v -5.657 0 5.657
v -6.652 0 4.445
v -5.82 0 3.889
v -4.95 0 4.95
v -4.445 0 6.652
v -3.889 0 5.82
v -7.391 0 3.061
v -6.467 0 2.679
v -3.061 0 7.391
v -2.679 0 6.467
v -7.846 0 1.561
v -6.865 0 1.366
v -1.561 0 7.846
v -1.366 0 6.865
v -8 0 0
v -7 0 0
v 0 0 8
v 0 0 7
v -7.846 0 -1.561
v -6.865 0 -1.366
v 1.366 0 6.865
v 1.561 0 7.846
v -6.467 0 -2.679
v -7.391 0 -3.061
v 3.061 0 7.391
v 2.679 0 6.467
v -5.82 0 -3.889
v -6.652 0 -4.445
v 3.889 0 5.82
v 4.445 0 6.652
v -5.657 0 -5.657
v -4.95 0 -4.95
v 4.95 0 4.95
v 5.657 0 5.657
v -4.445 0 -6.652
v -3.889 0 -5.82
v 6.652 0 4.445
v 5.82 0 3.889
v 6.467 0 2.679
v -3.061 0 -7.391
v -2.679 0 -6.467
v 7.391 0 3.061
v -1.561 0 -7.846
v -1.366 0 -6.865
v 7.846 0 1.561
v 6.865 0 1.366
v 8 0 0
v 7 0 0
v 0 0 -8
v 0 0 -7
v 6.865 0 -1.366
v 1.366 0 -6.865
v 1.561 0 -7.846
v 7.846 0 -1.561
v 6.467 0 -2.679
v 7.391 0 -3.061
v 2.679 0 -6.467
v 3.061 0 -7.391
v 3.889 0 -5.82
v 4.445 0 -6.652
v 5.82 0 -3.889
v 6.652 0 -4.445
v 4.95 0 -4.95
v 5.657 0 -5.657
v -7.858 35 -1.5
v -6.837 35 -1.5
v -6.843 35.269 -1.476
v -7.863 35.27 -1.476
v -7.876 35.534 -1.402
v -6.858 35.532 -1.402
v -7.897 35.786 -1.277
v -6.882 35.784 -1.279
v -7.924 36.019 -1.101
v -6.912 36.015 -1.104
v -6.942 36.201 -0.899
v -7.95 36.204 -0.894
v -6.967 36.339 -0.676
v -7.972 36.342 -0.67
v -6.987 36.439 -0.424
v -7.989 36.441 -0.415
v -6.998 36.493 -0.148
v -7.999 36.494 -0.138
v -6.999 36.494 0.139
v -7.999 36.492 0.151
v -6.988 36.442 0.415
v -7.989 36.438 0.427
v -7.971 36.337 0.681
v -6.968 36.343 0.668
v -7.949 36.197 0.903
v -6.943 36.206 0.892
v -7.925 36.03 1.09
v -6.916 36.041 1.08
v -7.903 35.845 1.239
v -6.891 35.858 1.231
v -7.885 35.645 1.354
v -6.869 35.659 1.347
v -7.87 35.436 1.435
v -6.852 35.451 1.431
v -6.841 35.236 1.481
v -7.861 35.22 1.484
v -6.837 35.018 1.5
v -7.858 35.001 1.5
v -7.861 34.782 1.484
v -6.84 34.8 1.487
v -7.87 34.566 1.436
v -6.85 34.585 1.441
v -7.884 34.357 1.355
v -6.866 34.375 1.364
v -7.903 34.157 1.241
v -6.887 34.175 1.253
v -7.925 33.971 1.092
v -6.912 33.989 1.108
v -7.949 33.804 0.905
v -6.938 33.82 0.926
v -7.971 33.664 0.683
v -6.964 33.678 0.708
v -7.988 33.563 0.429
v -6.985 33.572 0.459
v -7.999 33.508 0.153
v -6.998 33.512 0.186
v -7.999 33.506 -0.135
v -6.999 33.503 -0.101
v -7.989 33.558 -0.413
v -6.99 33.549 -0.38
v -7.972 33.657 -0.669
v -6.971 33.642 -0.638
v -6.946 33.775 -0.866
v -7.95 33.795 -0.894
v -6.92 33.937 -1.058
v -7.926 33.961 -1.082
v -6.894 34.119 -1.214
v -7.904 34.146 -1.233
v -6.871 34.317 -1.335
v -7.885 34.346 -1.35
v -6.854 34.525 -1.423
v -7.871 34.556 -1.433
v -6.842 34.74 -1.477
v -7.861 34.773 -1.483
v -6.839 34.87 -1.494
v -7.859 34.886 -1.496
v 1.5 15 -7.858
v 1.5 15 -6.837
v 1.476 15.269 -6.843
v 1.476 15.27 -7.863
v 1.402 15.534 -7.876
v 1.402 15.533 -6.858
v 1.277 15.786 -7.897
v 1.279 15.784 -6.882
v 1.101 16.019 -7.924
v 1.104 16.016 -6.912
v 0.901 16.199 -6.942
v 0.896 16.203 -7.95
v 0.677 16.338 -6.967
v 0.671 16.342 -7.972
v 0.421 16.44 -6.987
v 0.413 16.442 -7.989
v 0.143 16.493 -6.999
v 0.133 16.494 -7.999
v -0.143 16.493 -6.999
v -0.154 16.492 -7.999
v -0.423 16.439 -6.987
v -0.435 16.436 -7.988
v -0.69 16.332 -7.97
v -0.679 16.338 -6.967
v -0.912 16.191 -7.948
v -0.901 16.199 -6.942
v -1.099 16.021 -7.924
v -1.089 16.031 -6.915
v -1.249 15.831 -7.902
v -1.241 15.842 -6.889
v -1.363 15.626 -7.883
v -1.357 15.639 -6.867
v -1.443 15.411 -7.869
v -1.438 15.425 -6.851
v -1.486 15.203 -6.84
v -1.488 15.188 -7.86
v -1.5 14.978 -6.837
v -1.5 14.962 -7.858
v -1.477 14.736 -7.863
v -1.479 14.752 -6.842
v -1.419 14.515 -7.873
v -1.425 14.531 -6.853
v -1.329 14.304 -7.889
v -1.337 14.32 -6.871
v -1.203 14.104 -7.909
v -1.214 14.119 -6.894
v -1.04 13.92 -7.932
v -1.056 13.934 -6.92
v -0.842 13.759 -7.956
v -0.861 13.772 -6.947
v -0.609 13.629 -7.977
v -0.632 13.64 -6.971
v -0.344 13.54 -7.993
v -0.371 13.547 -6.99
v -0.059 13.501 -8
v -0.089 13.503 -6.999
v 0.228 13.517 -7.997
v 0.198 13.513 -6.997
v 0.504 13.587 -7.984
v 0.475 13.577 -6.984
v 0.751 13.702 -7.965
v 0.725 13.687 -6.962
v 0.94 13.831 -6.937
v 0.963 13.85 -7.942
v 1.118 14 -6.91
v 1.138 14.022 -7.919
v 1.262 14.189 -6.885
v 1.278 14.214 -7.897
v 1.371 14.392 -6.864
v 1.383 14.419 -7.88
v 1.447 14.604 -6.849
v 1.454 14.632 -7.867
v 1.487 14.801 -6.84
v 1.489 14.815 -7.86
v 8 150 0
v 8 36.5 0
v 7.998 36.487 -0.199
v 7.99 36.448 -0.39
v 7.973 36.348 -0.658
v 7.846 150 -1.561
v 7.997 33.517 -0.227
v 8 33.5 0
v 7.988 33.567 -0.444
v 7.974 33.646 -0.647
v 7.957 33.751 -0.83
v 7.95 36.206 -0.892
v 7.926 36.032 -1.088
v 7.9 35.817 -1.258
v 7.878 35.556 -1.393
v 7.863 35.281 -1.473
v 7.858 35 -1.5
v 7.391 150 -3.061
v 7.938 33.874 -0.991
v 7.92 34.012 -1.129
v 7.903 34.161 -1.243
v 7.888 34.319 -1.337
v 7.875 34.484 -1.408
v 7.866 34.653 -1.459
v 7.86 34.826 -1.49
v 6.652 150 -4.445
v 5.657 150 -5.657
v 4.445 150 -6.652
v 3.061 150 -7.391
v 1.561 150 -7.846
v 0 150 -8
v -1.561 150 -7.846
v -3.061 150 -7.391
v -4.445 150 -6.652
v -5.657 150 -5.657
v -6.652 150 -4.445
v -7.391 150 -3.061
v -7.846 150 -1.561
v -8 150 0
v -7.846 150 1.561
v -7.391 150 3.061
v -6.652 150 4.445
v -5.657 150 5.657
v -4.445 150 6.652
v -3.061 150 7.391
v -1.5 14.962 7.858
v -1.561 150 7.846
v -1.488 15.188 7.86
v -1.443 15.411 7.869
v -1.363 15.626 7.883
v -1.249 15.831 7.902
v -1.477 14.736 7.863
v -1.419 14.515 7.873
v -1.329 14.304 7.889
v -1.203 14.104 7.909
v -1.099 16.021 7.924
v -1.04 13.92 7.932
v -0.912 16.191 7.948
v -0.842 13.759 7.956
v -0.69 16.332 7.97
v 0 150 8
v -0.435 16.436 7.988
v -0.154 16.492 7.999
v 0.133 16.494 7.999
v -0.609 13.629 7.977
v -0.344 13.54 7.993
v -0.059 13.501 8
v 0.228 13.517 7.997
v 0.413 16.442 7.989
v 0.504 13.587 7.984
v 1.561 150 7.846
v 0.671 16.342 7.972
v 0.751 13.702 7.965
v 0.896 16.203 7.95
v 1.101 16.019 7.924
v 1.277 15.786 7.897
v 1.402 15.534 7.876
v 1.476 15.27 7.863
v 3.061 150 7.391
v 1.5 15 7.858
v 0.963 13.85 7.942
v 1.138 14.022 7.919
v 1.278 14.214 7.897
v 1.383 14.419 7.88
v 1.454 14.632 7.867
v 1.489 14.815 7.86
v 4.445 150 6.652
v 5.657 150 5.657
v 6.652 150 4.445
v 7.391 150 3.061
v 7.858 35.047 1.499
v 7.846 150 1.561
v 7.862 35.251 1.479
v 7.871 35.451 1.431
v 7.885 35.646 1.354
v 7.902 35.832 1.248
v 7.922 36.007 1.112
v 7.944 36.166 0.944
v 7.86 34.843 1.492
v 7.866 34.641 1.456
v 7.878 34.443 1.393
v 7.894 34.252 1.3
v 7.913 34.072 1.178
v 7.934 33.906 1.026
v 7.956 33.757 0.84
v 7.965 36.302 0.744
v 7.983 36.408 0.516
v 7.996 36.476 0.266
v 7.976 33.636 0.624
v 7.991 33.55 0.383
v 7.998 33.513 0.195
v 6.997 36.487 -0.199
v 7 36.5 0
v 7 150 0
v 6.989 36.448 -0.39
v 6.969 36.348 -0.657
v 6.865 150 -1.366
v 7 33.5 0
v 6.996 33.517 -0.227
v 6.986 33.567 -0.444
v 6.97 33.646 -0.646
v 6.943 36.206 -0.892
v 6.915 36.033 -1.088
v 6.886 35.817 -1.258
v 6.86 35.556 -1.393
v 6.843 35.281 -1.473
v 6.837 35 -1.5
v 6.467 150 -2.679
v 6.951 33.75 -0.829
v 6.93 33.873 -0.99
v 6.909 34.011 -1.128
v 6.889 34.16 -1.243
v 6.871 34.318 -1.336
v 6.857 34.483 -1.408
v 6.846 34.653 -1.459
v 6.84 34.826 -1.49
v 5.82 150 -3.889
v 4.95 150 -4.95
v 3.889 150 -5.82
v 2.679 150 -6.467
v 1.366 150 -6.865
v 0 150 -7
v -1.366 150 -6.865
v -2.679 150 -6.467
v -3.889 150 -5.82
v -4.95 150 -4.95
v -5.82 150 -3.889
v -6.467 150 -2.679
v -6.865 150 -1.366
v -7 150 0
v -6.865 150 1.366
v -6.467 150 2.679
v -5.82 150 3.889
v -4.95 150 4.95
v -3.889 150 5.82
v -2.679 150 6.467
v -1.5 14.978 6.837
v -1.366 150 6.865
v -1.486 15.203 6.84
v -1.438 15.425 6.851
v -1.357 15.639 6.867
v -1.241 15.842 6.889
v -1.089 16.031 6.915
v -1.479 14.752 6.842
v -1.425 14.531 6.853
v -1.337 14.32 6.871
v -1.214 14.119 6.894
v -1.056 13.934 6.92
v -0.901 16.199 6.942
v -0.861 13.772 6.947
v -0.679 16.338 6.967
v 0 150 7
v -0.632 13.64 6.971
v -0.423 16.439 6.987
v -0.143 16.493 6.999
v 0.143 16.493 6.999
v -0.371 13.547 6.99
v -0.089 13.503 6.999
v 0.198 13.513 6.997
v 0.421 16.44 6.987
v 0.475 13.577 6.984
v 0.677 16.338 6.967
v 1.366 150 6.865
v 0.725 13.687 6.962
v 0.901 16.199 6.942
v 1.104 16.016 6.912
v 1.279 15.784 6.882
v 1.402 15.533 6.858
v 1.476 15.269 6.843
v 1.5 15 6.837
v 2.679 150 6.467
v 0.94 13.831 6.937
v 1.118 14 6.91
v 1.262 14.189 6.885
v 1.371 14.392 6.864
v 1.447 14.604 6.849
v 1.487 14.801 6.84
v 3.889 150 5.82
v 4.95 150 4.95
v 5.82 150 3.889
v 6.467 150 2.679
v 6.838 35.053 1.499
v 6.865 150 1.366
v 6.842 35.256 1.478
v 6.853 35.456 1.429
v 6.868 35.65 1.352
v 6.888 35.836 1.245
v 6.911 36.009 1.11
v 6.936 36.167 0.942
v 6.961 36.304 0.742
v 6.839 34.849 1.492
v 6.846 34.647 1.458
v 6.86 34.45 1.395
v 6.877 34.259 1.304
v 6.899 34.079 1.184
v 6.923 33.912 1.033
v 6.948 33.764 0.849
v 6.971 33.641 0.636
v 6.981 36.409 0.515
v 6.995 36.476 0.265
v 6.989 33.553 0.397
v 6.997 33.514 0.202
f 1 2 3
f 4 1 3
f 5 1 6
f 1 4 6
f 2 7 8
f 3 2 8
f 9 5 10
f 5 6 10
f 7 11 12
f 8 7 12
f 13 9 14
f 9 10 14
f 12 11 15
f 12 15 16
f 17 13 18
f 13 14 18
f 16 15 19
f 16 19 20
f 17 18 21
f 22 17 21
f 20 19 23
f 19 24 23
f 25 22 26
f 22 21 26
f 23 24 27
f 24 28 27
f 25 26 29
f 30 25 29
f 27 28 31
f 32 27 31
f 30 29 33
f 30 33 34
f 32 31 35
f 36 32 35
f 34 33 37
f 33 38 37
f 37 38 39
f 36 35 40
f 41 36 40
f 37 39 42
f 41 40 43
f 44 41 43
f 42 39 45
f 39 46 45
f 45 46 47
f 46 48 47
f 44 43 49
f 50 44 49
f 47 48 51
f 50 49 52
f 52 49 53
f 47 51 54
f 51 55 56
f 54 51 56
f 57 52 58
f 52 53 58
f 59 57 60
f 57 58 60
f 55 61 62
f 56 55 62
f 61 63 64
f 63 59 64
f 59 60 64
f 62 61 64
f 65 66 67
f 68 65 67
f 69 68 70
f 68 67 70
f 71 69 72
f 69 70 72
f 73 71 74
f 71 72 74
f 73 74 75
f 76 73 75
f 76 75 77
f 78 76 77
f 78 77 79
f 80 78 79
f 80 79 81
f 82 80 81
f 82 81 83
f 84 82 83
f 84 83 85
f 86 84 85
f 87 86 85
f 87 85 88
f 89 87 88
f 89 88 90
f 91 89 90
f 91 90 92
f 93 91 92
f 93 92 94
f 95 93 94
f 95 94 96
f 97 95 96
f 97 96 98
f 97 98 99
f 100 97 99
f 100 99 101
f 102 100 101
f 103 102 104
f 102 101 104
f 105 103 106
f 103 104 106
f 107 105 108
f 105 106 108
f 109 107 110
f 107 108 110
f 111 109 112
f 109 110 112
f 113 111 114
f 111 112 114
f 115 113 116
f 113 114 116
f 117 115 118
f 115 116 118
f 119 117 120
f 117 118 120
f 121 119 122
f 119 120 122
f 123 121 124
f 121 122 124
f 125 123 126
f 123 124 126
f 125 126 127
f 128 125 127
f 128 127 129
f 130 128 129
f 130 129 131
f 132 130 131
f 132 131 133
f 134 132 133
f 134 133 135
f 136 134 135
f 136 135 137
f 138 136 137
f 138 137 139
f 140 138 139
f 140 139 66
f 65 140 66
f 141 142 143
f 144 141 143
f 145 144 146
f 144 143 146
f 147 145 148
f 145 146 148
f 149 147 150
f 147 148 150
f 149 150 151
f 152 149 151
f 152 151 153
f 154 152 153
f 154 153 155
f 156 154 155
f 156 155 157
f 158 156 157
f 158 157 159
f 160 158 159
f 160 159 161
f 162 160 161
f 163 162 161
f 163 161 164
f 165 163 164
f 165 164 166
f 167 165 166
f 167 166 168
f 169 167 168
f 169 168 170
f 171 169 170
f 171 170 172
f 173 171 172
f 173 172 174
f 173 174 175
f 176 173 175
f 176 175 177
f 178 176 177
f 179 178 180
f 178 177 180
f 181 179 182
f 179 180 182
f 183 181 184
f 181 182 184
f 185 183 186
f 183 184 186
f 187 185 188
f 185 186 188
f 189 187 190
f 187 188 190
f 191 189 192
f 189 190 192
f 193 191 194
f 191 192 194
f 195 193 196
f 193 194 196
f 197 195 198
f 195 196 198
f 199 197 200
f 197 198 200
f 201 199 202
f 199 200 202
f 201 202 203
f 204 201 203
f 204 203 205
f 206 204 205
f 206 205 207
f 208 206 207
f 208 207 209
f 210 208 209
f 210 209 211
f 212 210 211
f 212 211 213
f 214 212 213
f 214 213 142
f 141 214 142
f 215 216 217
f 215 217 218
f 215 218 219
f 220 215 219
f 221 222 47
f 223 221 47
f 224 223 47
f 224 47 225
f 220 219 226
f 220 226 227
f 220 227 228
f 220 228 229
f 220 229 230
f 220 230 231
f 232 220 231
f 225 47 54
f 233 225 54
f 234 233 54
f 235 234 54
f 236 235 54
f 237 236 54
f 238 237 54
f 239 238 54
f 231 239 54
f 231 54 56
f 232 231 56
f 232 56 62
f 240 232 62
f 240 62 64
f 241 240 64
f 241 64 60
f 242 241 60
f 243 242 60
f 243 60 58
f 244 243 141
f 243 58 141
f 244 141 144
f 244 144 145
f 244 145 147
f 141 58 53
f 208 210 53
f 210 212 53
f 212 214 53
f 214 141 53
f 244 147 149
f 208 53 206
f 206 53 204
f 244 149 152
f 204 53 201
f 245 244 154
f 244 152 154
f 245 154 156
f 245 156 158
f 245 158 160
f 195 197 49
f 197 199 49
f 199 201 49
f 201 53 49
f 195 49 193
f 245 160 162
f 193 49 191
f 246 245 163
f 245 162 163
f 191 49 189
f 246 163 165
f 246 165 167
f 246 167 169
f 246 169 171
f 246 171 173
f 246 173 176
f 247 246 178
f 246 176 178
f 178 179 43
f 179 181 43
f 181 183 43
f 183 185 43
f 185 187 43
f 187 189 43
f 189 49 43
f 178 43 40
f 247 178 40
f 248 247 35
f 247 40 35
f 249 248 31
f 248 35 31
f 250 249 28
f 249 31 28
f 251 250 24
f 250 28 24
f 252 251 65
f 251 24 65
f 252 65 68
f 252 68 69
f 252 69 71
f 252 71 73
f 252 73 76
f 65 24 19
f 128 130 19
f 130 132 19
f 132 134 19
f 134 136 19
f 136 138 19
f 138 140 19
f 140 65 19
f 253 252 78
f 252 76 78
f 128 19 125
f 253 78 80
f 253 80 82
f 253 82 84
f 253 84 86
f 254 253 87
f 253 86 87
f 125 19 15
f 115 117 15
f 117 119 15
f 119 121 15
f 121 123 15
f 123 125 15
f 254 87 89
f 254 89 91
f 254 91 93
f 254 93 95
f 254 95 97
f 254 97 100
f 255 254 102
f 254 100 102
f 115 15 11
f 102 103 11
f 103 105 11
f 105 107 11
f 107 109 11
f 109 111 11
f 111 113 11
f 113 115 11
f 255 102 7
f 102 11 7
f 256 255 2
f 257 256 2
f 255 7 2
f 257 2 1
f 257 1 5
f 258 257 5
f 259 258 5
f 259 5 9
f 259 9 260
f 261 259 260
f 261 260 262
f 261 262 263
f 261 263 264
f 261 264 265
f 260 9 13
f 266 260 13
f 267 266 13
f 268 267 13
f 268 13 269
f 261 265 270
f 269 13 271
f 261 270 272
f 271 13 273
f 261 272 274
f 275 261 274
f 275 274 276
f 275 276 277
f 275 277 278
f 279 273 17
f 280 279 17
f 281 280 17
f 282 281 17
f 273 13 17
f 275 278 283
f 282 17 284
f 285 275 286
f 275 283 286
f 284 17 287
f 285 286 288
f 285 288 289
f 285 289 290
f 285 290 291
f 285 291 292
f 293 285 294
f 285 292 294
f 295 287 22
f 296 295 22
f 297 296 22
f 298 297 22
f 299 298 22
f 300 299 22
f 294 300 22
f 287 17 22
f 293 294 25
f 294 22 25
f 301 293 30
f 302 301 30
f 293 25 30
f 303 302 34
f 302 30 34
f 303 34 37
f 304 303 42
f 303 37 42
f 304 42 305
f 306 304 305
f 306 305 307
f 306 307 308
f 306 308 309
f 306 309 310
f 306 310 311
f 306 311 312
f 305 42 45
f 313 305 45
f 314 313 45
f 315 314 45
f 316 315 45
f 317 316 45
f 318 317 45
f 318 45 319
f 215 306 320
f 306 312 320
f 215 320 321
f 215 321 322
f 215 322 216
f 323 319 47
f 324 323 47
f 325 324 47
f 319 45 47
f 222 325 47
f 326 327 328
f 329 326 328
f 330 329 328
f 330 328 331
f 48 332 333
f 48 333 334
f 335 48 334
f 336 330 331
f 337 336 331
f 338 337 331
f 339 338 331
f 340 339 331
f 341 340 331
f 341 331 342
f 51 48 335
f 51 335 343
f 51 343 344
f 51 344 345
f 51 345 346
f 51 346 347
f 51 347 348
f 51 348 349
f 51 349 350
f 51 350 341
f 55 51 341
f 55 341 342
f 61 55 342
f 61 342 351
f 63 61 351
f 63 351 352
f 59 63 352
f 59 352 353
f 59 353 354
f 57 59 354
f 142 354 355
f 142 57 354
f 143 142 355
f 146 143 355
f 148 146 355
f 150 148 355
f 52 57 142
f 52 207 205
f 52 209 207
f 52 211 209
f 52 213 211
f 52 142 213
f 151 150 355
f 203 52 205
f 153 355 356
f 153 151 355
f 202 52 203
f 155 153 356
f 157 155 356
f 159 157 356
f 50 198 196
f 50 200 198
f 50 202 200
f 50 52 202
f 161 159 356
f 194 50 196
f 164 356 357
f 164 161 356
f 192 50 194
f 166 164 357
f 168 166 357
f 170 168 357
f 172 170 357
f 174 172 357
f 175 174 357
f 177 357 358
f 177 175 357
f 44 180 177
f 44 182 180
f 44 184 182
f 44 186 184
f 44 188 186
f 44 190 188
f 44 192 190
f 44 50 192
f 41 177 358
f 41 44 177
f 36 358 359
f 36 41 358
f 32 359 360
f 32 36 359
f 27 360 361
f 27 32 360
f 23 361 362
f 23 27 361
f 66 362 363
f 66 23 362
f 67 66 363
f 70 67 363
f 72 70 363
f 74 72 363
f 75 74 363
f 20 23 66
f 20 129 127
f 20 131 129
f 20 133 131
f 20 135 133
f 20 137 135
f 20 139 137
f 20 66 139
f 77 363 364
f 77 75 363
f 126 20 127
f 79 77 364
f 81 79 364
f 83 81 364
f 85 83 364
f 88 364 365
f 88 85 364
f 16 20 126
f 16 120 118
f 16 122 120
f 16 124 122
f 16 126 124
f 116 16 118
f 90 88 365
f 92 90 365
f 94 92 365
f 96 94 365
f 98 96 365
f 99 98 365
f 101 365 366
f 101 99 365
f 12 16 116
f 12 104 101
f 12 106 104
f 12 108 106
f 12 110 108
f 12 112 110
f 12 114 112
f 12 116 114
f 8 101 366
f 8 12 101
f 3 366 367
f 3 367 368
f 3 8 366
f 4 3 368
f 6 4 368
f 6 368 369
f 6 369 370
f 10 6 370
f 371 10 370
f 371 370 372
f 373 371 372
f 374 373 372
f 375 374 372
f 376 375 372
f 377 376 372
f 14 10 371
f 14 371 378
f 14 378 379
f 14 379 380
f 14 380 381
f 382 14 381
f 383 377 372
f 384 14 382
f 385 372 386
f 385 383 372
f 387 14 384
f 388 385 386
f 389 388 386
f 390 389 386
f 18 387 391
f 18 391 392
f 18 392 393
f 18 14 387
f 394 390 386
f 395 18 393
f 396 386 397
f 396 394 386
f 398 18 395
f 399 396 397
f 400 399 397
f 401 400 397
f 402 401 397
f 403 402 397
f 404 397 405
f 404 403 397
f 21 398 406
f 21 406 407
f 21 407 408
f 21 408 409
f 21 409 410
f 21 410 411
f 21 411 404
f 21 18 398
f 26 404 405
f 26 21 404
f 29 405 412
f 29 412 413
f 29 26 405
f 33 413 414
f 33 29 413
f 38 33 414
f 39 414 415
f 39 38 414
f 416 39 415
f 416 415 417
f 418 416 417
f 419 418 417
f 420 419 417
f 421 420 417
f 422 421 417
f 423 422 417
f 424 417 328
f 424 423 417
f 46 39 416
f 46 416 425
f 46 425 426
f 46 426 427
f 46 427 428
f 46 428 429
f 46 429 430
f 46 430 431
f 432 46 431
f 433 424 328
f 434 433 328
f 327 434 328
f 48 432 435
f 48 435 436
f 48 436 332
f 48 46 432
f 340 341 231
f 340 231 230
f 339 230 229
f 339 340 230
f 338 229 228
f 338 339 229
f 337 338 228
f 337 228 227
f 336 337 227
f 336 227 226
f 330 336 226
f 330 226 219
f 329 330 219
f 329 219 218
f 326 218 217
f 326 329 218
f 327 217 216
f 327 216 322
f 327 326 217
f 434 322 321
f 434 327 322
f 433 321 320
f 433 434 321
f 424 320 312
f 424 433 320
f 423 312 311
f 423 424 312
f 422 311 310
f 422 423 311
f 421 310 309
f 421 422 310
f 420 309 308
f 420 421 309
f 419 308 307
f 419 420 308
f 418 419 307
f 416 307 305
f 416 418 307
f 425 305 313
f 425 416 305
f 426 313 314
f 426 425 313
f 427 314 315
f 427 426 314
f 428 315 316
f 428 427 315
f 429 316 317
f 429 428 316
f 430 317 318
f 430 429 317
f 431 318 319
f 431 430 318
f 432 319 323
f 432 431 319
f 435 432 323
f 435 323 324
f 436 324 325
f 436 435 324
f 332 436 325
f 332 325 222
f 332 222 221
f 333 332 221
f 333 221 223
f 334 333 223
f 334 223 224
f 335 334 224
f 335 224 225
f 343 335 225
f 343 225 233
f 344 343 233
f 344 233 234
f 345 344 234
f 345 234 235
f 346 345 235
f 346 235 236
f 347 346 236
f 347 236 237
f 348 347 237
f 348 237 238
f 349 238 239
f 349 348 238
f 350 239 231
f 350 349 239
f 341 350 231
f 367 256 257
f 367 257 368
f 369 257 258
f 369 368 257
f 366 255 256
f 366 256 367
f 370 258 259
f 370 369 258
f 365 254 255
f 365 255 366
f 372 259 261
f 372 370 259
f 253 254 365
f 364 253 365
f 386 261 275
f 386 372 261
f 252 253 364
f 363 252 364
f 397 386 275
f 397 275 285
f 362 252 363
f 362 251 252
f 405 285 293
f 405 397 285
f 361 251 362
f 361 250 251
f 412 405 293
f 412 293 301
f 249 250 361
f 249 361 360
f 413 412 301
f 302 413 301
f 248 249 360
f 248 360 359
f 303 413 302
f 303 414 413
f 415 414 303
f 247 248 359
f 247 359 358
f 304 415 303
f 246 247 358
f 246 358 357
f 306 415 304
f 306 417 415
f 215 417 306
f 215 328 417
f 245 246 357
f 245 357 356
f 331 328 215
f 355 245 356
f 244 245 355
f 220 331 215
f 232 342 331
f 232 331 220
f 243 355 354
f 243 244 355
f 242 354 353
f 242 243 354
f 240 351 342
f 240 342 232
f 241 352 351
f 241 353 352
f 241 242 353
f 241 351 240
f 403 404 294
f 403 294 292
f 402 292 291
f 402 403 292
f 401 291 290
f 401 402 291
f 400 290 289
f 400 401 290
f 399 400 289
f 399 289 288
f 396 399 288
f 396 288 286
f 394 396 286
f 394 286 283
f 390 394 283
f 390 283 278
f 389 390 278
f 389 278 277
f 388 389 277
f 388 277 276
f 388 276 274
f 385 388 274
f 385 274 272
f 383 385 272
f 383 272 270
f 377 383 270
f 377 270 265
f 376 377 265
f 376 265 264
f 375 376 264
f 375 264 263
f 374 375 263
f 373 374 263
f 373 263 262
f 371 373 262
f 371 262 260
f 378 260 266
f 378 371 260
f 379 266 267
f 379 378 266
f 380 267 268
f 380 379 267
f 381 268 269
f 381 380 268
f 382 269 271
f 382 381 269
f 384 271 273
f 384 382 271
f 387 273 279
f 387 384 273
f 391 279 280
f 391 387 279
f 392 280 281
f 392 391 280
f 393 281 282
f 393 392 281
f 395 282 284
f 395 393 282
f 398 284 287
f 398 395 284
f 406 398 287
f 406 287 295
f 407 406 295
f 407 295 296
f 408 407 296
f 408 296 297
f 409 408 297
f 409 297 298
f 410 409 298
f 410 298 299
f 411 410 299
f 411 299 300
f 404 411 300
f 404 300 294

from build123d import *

# Parameters (mm, degrees)
SKETCH_1_R               = 8
SKETCH_1_R_2             = 7
EXTRUDE_1_DEPTH          = 150
SKETCH_2_R               = 1.5
CUT_EXTRUDE_1_DEPTH      = 9
CUT_EXTRUDE_1_DEPTH_BACK = 9
SKETCH_4_R               = 1.5
CUT_EXTRUDE_2_DEPTH      = 9.0000001
CUT_EXTRUDE_2_DEPTH_BACK = 9.0000001


with BuildPart() as part:
    # 草图1 → 凸台-拉伸1 (new body)
    with BuildSketch(Plane(origin=(0, 0, 0), x_dir=(1, 0, 0), z_dir=(0, 1, 0))):
        Circle(SKETCH_1_R)
        Circle(SKETCH_1_R_2, mode=Mode.SUBTRACT)
    extrude(amount=EXTRUDE_1_DEPTH)

    # 草图2 → 切除-拉伸1 (cut, two sides)
    with BuildSketch(Plane.XY) as cut_extrude_1_sk:
        with Locations((0, 15)):
            Circle(SKETCH_2_R)
    extrude(amount=CUT_EXTRUDE_1_DEPTH, mode=Mode.SUBTRACT)
    extrude(cut_extrude_1_sk.sketch, amount=-CUT_EXTRUDE_1_DEPTH_BACK, mode=Mode.SUBTRACT)

    # 草图4 → 切除-拉伸2 (cut, two sides)
    with BuildSketch(Plane(origin=(0, 0, 0), x_dir=(0, 0, -1), z_dir=(1, 0, 0))) as cut_extrude_2_sk:
        with Locations((0, 35)):
            Circle(SKETCH_4_R)
    extrude(amount=CUT_EXTRUDE_2_DEPTH, mode=Mode.SUBTRACT)
    extrude(cut_extrude_2_sk.sketch, amount=-CUT_EXTRUDE_2_DEPTH_BACK, mode=Mode.SUBTRACT)


solid = part.part
